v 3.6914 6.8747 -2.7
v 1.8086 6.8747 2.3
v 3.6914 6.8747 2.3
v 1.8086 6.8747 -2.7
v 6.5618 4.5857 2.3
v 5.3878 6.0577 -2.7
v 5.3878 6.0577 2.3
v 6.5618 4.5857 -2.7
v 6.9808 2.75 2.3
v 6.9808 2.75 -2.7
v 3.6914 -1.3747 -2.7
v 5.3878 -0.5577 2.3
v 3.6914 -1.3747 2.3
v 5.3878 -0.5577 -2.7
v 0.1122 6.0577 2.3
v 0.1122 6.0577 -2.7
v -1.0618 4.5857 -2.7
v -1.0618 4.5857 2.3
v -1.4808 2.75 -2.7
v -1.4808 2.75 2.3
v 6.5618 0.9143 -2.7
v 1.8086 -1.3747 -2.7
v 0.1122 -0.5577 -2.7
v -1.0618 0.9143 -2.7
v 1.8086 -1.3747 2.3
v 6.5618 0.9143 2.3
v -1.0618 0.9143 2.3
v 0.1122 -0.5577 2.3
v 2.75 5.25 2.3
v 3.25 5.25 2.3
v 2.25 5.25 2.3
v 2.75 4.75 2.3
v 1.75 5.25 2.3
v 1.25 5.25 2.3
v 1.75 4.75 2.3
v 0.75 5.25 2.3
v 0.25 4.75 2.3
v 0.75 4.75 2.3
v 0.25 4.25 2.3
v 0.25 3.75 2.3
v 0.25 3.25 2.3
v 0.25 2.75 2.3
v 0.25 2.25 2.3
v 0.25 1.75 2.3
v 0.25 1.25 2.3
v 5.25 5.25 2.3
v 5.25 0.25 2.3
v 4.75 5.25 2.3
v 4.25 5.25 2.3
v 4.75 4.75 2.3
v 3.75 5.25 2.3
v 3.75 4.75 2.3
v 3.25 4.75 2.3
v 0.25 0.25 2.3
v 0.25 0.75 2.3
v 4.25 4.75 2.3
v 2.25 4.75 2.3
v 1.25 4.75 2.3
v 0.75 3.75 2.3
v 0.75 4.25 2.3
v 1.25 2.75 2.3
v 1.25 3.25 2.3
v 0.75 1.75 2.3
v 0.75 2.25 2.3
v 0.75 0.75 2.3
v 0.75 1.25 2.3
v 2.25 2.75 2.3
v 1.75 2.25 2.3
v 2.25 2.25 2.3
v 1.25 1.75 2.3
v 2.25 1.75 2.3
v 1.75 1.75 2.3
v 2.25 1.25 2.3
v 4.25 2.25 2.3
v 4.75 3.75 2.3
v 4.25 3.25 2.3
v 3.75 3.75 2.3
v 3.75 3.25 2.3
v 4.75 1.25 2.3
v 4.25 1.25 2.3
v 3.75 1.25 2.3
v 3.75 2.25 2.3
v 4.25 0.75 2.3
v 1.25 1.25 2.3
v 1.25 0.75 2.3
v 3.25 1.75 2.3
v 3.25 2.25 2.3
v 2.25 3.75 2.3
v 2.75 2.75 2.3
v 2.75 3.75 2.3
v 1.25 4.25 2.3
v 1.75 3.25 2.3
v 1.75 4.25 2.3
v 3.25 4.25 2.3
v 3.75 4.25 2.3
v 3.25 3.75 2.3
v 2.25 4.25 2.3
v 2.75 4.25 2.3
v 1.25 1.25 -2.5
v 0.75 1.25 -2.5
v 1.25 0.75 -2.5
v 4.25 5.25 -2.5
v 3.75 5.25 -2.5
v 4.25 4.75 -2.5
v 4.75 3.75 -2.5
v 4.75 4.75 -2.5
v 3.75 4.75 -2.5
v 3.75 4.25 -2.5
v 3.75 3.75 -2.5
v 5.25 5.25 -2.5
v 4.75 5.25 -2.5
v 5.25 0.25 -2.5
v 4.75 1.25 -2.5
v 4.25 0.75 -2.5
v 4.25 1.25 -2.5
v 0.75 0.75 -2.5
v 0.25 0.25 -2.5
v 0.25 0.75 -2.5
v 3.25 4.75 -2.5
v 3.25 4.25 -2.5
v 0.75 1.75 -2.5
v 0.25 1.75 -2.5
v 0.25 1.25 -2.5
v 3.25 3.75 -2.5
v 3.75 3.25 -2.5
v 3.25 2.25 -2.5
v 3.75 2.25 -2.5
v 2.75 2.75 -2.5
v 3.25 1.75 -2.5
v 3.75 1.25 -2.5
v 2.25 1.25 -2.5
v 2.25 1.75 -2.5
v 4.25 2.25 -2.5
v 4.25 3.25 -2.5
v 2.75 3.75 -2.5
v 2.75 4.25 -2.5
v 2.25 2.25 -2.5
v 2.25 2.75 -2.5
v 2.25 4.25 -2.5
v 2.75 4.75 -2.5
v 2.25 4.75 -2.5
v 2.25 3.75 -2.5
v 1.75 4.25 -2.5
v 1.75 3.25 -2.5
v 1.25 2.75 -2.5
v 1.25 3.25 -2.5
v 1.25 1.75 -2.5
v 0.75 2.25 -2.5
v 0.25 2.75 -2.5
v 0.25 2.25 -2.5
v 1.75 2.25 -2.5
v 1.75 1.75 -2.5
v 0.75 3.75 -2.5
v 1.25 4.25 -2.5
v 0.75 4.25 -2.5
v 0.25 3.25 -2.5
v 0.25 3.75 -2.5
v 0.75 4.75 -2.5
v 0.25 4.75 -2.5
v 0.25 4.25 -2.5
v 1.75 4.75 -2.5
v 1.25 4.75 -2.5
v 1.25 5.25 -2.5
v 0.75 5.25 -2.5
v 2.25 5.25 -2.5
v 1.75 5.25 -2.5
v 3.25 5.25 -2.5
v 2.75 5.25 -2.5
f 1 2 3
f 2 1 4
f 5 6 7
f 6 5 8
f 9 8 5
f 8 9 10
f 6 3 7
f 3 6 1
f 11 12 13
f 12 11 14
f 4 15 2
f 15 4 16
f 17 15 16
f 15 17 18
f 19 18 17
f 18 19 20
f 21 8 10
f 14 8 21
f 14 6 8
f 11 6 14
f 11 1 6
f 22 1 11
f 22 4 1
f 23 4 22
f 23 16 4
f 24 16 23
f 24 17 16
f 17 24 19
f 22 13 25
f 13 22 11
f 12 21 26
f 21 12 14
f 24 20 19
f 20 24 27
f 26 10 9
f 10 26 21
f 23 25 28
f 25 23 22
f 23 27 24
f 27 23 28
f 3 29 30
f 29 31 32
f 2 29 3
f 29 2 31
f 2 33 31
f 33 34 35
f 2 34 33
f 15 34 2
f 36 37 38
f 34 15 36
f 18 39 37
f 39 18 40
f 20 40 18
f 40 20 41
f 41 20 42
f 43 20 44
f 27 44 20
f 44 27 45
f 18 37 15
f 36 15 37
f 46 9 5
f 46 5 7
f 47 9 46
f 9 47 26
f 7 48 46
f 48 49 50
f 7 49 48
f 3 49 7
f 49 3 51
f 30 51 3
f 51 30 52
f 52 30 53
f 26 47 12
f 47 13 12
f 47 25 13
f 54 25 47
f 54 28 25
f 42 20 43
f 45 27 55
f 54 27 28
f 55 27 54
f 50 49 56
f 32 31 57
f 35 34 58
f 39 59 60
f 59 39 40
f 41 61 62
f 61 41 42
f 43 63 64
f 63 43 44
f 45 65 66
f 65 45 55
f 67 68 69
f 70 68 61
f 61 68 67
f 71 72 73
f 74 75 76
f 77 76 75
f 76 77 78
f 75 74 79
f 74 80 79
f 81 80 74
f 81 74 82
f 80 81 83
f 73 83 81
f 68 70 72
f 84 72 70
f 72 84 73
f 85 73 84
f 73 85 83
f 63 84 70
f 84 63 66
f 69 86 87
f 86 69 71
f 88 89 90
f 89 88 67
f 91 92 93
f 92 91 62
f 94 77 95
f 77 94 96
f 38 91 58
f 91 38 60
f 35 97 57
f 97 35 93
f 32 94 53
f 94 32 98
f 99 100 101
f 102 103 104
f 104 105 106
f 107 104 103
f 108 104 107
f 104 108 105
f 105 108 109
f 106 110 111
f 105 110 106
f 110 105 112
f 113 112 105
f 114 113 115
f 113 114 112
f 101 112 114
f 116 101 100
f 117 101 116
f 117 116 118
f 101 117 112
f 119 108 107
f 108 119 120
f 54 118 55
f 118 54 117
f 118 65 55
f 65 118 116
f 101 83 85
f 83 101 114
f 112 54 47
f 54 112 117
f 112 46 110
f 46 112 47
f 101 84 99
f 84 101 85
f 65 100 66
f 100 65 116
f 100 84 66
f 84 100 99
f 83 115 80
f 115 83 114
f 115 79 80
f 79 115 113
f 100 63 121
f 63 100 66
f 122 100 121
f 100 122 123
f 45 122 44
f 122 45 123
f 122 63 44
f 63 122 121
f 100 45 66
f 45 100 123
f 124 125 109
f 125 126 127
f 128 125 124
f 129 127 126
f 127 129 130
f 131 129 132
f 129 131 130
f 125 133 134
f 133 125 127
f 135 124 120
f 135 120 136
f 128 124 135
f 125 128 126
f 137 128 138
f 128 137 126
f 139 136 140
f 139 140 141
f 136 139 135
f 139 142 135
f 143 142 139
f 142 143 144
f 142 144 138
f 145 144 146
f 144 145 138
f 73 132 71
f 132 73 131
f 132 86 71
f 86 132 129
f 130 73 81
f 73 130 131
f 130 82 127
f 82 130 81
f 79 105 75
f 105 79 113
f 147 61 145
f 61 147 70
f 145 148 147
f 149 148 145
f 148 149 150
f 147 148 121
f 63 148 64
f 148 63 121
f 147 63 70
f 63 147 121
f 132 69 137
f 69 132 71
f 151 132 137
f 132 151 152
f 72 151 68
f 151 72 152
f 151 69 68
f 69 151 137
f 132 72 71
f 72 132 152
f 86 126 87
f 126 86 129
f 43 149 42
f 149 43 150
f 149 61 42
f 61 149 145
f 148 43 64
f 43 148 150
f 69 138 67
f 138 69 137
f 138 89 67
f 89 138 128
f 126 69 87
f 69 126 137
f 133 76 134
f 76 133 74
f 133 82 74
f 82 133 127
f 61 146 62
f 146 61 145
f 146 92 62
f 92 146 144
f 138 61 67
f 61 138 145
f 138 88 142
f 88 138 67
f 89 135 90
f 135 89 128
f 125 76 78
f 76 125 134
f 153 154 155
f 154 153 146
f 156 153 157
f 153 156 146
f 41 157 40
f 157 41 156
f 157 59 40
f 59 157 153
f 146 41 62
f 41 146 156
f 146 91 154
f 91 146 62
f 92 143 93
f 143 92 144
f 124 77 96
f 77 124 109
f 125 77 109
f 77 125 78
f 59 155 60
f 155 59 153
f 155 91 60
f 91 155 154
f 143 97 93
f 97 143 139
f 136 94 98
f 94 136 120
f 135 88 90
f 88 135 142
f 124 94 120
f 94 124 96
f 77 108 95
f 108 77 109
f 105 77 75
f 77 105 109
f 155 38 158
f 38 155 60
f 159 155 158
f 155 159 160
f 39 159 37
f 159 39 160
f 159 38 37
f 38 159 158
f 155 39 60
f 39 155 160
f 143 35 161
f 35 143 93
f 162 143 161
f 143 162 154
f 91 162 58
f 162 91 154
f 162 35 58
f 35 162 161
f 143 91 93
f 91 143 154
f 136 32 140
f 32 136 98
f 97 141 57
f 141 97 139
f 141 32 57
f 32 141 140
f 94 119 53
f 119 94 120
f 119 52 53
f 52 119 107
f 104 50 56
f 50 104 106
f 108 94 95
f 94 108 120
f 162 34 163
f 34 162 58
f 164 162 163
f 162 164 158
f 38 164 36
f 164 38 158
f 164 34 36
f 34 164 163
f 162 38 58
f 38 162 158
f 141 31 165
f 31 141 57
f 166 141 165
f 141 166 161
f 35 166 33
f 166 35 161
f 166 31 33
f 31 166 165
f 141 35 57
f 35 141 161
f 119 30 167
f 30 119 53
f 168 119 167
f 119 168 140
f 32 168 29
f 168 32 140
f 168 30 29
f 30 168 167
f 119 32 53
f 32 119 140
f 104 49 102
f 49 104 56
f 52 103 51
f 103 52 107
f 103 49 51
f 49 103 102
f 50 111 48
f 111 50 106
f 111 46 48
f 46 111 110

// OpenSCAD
rotate([0,0,0])difference(){translate([2.75,2.75,-0.2])  cylinder(r=4.23076923076923,h=5, center=true);
translate([0.5,0.5,0])  cube(size = [0.5,0.5,5], center=true);
translate([1,0.5,0])  cube(size = [0.5,0.5,5], center=true);
translate([1.5,0.5,0])  cube(size = [0.5,0.5,5], center=true);
translate([2,0.5,0])  cube(size = [0.5,0.5,5], center=true);
translate([2.5,0.5,0])  cube(size = [0.5,0.5,5], center=true);
translate([3,0.5,0])  cube(size = [0.5,0.5,5], center=true);
translate([3.5,0.5,0])  cube(size = [0.5,0.5,5], center=true);
translate([4,0.5,0])  cube(size = [0.5,0.5,5], center=true);
translate([4.5,0.5,0])  cube(size = [0.5,0.5,5], center=true);
translate([5,0.5,0])  cube(size = [0.5,0.5,5], center=true);
translate([5,0.5,0])  cube(size = [0.5,0.5,5], center=true);
translate([1,1,0])  cube(size = [0.5,0.5,5], center=true);
translate([1,1,0])  cube(size = [0.5,0.5,5], center=true);
translate([1,1,0])  cube(size = [0.5,0.5,5], center=true);
translate([1,1,0])  cube(size = [0.5,0.5,5], center=true);
translate([1,1,0])  cube(size = [0.5,0.5,5], center=true);
translate([1,1,0])  cube(size = [0.5,0.5,5], center=true);
translate([1,1,0])  cube(size = [0.5,0.5,5], center=true);
translate([4.5,1,0])  cube(size = [0.5,0.5,5], center=true);
translate([5,1,0])  cube(size = [0.5,0.5,5], center=true);
translate([0.5,1.5,0])  cube(size = [0.5,0.5,5], center=true);
translate([0.5,1.5,0])  cube(size = [0.5,0.5,5], center=true);
translate([0.5,1.5,0])  cube(size = [0.5,0.5,5], center=true);
translate([0.5,1.5,0])  cube(size = [0.5,0.5,5], center=true);
translate([2.5,1.5,0])  cube(size = [0.5,0.5,5], center=true);
translate([3,1.5,0])  cube(size = [0.5,0.5,5], center=true);
translate([3.5,1.5,0])  cube(size = [0.5,0.5,5], center=true);
translate([3.5,1.5,0])  cube(size = [0.5,0.5,5], center=true);
translate([3.5,1.5,0])  cube(size = [0.5,0.5,5], center=true);
translate([5,1.5,0])  cube(size = [0.5,0.5,5], center=true);
translate([5,1.5,0])  cube(size = [0.5,0.5,5], center=true);
translate([1,2,0])  cube(size = [0.5,0.5,5], center=true);
translate([1,2,0])  cube(size = [0.5,0.5,5], center=true);
translate([2,2,0])  cube(size = [0.5,0.5,5], center=true);
translate([2,2,0])  cube(size = [0.5,0.5,5], center=true);
translate([2,2,0])  cube(size = [0.5,0.5,5], center=true);
translate([3.5,2,0])  cube(size = [0.5,0.5,5], center=true);
translate([3.5,2,0])  cube(size = [0.5,0.5,5], center=true);
translate([3.5,2,0])  cube(size = [0.5,0.5,5], center=true);
translate([5,2,0])  cube(size = [0.5,0.5,5], center=true);
translate([0.5,2.5,0])  cube(size = [0.5,0.5,5], center=true);
translate([1,2.5,0])  cube(size = [0.5,0.5,5], center=true);
translate([1,2.5,0])  cube(size = [0.5,0.5,5], center=true);
translate([1,2.5,0])  cube(size = [0.5,0.5,5], center=true);
translate([2.5,2.5,0])  cube(size = [0.5,0.5,5], center=true);
translate([3,2.5,0])  cube(size = [0.5,0.5,5], center=true);
translate([3.5,2.5,0])  cube(size = [0.5,0.5,5], center=true);
translate([4,2.5,0])  cube(size = [0.5,0.5,5], center=true);
translate([4,2.5,0])  cube(size = [0.5,0.5,5], center=true);
translate([5,2.5,0])  cube(size = [0.5,0.5,5], center=true);
translate([5,2.5,0])  cube(size = [0.5,0.5,5], center=true);
translate([5,2.5,0])  cube(size = [0.5,0.5,5], center=true);
translate([1.5,3,0])  cube(size = [0.5,0.5,5], center=true);
translate([2,3,0])  cube(size = [0.5,0.5,5], center=true);
translate([2,3,0])  cube(size = [0.5,0.5,5], center=true);
translate([3,3,0])  cube(size = [0.5,0.5,5], center=true);
translate([3.5,3,0])  cube(size = [0.5,0.5,5], center=true);
translate([4,3,0])  cube(size = [0.5,0.5,5], center=true);
translate([4,3,0])  cube(size = [0.5,0.5,5], center=true);
translate([5,3,0])  cube(size = [0.5,0.5,5], center=true);
translate([0.5,3.5,0])  cube(size = [0.5,0.5,5], center=true);
translate([1,3.5,0])  cube(size = [0.5,0.5,5], center=true);
translate([1,3.5,0])  cube(size = [0.5,0.5,5], center=true);
translate([2,3.5,0])  cube(size = [0.5,0.5,5], center=true);
translate([2,3.5,0])  cube(size = [0.5,0.5,5], center=true);
translate([3,3.5,0])  cube(size = [0.5,0.5,5], center=true);
translate([3.5,3.5,0])  cube(size = [0.5,0.5,5], center=true);
translate([3.5,3.5,0])  cube(size = [0.5,0.5,5], center=true);
translate([3.5,3.5,0])  cube(size = [0.5,0.5,5], center=true);
translate([5,3.5,0])  cube(size = [0.5,0.5,5], center=true);
translate([5,3.5,0])  cube(size = [0.5,0.5,5], center=true);
translate([1,4,0])  cube(size = [0.5,0.5,5], center=true);
translate([1,4,0])  cube(size = [0.5,0.5,5], center=true);
translate([2,4,0])  cube(size = [0.5,0.5,5], center=true);
translate([2.5,4,0])  cube(size = [0.5,0.5,5], center=true);
translate([3,4,0])  cube(size = [0.5,0.5,5], center=true);
translate([3,4,0])  cube(size = [0.5,0.5,5], center=true);
translate([4,4,0])  cube(size = [0.5,0.5,5], center=true);
translate([4.5,4,0])  cube(size = [0.5,0.5,5], center=true);
translate([5,4,0])  cube(size = [0.5,0.5,5], center=true);
translate([0.5,4.5,0])  cube(size = [0.5,0.5,5], center=true);
translate([0.5,4.5,0])  cube(size = [0.5,0.5,5], center=true);
translate([1.5,4.5,0])  cube(size = [0.5,0.5,5], center=true);
translate([1.5,4.5,0])  cube(size = [0.5,0.5,5], center=true);
translate([2.5,4.5,0])  cube(size = [0.5,0.5,5], center=true);
translate([2.5,4.5,0])  cube(size = [0.5,0.5,5], center=true);
translate([3.5,4.5,0])  cube(size = [0.5,0.5,5], center=true);
translate([4,4.5,0])  cube(size = [0.5,0.5,5], center=true);
translate([4.5,4.5,0])  cube(size = [0.5,0.5,5], center=true);
translate([5,4.5,0])  cube(size = [0.5,0.5,5], center=true);
translate([5,4.5,0])  cube(size = [0.5,0.5,5], center=true);
translate([1,5,0])  cube(size = [0.5,0.5,5], center=true);
translate([1,5,0])  cube(size = [0.5,0.5,5], center=true);
translate([2,5,0])  cube(size = [0.5,0.5,5], center=true);
translate([2,5,0])  cube(size = [0.5,0.5,5], center=true);
translate([3,5,0])  cube(size = [0.5,0.5,5], center=true);
translate([3,5,0])  cube(size = [0.5,0.5,5], center=true);
translate([4,5,0])  cube(size = [0.5,0.5,5], center=true);
translate([4,5,0])  cube(size = [0.5,0.5,5], center=true);
translate([5,5,0])  cube(size = [0.5,0.5,5], center=true);
}
